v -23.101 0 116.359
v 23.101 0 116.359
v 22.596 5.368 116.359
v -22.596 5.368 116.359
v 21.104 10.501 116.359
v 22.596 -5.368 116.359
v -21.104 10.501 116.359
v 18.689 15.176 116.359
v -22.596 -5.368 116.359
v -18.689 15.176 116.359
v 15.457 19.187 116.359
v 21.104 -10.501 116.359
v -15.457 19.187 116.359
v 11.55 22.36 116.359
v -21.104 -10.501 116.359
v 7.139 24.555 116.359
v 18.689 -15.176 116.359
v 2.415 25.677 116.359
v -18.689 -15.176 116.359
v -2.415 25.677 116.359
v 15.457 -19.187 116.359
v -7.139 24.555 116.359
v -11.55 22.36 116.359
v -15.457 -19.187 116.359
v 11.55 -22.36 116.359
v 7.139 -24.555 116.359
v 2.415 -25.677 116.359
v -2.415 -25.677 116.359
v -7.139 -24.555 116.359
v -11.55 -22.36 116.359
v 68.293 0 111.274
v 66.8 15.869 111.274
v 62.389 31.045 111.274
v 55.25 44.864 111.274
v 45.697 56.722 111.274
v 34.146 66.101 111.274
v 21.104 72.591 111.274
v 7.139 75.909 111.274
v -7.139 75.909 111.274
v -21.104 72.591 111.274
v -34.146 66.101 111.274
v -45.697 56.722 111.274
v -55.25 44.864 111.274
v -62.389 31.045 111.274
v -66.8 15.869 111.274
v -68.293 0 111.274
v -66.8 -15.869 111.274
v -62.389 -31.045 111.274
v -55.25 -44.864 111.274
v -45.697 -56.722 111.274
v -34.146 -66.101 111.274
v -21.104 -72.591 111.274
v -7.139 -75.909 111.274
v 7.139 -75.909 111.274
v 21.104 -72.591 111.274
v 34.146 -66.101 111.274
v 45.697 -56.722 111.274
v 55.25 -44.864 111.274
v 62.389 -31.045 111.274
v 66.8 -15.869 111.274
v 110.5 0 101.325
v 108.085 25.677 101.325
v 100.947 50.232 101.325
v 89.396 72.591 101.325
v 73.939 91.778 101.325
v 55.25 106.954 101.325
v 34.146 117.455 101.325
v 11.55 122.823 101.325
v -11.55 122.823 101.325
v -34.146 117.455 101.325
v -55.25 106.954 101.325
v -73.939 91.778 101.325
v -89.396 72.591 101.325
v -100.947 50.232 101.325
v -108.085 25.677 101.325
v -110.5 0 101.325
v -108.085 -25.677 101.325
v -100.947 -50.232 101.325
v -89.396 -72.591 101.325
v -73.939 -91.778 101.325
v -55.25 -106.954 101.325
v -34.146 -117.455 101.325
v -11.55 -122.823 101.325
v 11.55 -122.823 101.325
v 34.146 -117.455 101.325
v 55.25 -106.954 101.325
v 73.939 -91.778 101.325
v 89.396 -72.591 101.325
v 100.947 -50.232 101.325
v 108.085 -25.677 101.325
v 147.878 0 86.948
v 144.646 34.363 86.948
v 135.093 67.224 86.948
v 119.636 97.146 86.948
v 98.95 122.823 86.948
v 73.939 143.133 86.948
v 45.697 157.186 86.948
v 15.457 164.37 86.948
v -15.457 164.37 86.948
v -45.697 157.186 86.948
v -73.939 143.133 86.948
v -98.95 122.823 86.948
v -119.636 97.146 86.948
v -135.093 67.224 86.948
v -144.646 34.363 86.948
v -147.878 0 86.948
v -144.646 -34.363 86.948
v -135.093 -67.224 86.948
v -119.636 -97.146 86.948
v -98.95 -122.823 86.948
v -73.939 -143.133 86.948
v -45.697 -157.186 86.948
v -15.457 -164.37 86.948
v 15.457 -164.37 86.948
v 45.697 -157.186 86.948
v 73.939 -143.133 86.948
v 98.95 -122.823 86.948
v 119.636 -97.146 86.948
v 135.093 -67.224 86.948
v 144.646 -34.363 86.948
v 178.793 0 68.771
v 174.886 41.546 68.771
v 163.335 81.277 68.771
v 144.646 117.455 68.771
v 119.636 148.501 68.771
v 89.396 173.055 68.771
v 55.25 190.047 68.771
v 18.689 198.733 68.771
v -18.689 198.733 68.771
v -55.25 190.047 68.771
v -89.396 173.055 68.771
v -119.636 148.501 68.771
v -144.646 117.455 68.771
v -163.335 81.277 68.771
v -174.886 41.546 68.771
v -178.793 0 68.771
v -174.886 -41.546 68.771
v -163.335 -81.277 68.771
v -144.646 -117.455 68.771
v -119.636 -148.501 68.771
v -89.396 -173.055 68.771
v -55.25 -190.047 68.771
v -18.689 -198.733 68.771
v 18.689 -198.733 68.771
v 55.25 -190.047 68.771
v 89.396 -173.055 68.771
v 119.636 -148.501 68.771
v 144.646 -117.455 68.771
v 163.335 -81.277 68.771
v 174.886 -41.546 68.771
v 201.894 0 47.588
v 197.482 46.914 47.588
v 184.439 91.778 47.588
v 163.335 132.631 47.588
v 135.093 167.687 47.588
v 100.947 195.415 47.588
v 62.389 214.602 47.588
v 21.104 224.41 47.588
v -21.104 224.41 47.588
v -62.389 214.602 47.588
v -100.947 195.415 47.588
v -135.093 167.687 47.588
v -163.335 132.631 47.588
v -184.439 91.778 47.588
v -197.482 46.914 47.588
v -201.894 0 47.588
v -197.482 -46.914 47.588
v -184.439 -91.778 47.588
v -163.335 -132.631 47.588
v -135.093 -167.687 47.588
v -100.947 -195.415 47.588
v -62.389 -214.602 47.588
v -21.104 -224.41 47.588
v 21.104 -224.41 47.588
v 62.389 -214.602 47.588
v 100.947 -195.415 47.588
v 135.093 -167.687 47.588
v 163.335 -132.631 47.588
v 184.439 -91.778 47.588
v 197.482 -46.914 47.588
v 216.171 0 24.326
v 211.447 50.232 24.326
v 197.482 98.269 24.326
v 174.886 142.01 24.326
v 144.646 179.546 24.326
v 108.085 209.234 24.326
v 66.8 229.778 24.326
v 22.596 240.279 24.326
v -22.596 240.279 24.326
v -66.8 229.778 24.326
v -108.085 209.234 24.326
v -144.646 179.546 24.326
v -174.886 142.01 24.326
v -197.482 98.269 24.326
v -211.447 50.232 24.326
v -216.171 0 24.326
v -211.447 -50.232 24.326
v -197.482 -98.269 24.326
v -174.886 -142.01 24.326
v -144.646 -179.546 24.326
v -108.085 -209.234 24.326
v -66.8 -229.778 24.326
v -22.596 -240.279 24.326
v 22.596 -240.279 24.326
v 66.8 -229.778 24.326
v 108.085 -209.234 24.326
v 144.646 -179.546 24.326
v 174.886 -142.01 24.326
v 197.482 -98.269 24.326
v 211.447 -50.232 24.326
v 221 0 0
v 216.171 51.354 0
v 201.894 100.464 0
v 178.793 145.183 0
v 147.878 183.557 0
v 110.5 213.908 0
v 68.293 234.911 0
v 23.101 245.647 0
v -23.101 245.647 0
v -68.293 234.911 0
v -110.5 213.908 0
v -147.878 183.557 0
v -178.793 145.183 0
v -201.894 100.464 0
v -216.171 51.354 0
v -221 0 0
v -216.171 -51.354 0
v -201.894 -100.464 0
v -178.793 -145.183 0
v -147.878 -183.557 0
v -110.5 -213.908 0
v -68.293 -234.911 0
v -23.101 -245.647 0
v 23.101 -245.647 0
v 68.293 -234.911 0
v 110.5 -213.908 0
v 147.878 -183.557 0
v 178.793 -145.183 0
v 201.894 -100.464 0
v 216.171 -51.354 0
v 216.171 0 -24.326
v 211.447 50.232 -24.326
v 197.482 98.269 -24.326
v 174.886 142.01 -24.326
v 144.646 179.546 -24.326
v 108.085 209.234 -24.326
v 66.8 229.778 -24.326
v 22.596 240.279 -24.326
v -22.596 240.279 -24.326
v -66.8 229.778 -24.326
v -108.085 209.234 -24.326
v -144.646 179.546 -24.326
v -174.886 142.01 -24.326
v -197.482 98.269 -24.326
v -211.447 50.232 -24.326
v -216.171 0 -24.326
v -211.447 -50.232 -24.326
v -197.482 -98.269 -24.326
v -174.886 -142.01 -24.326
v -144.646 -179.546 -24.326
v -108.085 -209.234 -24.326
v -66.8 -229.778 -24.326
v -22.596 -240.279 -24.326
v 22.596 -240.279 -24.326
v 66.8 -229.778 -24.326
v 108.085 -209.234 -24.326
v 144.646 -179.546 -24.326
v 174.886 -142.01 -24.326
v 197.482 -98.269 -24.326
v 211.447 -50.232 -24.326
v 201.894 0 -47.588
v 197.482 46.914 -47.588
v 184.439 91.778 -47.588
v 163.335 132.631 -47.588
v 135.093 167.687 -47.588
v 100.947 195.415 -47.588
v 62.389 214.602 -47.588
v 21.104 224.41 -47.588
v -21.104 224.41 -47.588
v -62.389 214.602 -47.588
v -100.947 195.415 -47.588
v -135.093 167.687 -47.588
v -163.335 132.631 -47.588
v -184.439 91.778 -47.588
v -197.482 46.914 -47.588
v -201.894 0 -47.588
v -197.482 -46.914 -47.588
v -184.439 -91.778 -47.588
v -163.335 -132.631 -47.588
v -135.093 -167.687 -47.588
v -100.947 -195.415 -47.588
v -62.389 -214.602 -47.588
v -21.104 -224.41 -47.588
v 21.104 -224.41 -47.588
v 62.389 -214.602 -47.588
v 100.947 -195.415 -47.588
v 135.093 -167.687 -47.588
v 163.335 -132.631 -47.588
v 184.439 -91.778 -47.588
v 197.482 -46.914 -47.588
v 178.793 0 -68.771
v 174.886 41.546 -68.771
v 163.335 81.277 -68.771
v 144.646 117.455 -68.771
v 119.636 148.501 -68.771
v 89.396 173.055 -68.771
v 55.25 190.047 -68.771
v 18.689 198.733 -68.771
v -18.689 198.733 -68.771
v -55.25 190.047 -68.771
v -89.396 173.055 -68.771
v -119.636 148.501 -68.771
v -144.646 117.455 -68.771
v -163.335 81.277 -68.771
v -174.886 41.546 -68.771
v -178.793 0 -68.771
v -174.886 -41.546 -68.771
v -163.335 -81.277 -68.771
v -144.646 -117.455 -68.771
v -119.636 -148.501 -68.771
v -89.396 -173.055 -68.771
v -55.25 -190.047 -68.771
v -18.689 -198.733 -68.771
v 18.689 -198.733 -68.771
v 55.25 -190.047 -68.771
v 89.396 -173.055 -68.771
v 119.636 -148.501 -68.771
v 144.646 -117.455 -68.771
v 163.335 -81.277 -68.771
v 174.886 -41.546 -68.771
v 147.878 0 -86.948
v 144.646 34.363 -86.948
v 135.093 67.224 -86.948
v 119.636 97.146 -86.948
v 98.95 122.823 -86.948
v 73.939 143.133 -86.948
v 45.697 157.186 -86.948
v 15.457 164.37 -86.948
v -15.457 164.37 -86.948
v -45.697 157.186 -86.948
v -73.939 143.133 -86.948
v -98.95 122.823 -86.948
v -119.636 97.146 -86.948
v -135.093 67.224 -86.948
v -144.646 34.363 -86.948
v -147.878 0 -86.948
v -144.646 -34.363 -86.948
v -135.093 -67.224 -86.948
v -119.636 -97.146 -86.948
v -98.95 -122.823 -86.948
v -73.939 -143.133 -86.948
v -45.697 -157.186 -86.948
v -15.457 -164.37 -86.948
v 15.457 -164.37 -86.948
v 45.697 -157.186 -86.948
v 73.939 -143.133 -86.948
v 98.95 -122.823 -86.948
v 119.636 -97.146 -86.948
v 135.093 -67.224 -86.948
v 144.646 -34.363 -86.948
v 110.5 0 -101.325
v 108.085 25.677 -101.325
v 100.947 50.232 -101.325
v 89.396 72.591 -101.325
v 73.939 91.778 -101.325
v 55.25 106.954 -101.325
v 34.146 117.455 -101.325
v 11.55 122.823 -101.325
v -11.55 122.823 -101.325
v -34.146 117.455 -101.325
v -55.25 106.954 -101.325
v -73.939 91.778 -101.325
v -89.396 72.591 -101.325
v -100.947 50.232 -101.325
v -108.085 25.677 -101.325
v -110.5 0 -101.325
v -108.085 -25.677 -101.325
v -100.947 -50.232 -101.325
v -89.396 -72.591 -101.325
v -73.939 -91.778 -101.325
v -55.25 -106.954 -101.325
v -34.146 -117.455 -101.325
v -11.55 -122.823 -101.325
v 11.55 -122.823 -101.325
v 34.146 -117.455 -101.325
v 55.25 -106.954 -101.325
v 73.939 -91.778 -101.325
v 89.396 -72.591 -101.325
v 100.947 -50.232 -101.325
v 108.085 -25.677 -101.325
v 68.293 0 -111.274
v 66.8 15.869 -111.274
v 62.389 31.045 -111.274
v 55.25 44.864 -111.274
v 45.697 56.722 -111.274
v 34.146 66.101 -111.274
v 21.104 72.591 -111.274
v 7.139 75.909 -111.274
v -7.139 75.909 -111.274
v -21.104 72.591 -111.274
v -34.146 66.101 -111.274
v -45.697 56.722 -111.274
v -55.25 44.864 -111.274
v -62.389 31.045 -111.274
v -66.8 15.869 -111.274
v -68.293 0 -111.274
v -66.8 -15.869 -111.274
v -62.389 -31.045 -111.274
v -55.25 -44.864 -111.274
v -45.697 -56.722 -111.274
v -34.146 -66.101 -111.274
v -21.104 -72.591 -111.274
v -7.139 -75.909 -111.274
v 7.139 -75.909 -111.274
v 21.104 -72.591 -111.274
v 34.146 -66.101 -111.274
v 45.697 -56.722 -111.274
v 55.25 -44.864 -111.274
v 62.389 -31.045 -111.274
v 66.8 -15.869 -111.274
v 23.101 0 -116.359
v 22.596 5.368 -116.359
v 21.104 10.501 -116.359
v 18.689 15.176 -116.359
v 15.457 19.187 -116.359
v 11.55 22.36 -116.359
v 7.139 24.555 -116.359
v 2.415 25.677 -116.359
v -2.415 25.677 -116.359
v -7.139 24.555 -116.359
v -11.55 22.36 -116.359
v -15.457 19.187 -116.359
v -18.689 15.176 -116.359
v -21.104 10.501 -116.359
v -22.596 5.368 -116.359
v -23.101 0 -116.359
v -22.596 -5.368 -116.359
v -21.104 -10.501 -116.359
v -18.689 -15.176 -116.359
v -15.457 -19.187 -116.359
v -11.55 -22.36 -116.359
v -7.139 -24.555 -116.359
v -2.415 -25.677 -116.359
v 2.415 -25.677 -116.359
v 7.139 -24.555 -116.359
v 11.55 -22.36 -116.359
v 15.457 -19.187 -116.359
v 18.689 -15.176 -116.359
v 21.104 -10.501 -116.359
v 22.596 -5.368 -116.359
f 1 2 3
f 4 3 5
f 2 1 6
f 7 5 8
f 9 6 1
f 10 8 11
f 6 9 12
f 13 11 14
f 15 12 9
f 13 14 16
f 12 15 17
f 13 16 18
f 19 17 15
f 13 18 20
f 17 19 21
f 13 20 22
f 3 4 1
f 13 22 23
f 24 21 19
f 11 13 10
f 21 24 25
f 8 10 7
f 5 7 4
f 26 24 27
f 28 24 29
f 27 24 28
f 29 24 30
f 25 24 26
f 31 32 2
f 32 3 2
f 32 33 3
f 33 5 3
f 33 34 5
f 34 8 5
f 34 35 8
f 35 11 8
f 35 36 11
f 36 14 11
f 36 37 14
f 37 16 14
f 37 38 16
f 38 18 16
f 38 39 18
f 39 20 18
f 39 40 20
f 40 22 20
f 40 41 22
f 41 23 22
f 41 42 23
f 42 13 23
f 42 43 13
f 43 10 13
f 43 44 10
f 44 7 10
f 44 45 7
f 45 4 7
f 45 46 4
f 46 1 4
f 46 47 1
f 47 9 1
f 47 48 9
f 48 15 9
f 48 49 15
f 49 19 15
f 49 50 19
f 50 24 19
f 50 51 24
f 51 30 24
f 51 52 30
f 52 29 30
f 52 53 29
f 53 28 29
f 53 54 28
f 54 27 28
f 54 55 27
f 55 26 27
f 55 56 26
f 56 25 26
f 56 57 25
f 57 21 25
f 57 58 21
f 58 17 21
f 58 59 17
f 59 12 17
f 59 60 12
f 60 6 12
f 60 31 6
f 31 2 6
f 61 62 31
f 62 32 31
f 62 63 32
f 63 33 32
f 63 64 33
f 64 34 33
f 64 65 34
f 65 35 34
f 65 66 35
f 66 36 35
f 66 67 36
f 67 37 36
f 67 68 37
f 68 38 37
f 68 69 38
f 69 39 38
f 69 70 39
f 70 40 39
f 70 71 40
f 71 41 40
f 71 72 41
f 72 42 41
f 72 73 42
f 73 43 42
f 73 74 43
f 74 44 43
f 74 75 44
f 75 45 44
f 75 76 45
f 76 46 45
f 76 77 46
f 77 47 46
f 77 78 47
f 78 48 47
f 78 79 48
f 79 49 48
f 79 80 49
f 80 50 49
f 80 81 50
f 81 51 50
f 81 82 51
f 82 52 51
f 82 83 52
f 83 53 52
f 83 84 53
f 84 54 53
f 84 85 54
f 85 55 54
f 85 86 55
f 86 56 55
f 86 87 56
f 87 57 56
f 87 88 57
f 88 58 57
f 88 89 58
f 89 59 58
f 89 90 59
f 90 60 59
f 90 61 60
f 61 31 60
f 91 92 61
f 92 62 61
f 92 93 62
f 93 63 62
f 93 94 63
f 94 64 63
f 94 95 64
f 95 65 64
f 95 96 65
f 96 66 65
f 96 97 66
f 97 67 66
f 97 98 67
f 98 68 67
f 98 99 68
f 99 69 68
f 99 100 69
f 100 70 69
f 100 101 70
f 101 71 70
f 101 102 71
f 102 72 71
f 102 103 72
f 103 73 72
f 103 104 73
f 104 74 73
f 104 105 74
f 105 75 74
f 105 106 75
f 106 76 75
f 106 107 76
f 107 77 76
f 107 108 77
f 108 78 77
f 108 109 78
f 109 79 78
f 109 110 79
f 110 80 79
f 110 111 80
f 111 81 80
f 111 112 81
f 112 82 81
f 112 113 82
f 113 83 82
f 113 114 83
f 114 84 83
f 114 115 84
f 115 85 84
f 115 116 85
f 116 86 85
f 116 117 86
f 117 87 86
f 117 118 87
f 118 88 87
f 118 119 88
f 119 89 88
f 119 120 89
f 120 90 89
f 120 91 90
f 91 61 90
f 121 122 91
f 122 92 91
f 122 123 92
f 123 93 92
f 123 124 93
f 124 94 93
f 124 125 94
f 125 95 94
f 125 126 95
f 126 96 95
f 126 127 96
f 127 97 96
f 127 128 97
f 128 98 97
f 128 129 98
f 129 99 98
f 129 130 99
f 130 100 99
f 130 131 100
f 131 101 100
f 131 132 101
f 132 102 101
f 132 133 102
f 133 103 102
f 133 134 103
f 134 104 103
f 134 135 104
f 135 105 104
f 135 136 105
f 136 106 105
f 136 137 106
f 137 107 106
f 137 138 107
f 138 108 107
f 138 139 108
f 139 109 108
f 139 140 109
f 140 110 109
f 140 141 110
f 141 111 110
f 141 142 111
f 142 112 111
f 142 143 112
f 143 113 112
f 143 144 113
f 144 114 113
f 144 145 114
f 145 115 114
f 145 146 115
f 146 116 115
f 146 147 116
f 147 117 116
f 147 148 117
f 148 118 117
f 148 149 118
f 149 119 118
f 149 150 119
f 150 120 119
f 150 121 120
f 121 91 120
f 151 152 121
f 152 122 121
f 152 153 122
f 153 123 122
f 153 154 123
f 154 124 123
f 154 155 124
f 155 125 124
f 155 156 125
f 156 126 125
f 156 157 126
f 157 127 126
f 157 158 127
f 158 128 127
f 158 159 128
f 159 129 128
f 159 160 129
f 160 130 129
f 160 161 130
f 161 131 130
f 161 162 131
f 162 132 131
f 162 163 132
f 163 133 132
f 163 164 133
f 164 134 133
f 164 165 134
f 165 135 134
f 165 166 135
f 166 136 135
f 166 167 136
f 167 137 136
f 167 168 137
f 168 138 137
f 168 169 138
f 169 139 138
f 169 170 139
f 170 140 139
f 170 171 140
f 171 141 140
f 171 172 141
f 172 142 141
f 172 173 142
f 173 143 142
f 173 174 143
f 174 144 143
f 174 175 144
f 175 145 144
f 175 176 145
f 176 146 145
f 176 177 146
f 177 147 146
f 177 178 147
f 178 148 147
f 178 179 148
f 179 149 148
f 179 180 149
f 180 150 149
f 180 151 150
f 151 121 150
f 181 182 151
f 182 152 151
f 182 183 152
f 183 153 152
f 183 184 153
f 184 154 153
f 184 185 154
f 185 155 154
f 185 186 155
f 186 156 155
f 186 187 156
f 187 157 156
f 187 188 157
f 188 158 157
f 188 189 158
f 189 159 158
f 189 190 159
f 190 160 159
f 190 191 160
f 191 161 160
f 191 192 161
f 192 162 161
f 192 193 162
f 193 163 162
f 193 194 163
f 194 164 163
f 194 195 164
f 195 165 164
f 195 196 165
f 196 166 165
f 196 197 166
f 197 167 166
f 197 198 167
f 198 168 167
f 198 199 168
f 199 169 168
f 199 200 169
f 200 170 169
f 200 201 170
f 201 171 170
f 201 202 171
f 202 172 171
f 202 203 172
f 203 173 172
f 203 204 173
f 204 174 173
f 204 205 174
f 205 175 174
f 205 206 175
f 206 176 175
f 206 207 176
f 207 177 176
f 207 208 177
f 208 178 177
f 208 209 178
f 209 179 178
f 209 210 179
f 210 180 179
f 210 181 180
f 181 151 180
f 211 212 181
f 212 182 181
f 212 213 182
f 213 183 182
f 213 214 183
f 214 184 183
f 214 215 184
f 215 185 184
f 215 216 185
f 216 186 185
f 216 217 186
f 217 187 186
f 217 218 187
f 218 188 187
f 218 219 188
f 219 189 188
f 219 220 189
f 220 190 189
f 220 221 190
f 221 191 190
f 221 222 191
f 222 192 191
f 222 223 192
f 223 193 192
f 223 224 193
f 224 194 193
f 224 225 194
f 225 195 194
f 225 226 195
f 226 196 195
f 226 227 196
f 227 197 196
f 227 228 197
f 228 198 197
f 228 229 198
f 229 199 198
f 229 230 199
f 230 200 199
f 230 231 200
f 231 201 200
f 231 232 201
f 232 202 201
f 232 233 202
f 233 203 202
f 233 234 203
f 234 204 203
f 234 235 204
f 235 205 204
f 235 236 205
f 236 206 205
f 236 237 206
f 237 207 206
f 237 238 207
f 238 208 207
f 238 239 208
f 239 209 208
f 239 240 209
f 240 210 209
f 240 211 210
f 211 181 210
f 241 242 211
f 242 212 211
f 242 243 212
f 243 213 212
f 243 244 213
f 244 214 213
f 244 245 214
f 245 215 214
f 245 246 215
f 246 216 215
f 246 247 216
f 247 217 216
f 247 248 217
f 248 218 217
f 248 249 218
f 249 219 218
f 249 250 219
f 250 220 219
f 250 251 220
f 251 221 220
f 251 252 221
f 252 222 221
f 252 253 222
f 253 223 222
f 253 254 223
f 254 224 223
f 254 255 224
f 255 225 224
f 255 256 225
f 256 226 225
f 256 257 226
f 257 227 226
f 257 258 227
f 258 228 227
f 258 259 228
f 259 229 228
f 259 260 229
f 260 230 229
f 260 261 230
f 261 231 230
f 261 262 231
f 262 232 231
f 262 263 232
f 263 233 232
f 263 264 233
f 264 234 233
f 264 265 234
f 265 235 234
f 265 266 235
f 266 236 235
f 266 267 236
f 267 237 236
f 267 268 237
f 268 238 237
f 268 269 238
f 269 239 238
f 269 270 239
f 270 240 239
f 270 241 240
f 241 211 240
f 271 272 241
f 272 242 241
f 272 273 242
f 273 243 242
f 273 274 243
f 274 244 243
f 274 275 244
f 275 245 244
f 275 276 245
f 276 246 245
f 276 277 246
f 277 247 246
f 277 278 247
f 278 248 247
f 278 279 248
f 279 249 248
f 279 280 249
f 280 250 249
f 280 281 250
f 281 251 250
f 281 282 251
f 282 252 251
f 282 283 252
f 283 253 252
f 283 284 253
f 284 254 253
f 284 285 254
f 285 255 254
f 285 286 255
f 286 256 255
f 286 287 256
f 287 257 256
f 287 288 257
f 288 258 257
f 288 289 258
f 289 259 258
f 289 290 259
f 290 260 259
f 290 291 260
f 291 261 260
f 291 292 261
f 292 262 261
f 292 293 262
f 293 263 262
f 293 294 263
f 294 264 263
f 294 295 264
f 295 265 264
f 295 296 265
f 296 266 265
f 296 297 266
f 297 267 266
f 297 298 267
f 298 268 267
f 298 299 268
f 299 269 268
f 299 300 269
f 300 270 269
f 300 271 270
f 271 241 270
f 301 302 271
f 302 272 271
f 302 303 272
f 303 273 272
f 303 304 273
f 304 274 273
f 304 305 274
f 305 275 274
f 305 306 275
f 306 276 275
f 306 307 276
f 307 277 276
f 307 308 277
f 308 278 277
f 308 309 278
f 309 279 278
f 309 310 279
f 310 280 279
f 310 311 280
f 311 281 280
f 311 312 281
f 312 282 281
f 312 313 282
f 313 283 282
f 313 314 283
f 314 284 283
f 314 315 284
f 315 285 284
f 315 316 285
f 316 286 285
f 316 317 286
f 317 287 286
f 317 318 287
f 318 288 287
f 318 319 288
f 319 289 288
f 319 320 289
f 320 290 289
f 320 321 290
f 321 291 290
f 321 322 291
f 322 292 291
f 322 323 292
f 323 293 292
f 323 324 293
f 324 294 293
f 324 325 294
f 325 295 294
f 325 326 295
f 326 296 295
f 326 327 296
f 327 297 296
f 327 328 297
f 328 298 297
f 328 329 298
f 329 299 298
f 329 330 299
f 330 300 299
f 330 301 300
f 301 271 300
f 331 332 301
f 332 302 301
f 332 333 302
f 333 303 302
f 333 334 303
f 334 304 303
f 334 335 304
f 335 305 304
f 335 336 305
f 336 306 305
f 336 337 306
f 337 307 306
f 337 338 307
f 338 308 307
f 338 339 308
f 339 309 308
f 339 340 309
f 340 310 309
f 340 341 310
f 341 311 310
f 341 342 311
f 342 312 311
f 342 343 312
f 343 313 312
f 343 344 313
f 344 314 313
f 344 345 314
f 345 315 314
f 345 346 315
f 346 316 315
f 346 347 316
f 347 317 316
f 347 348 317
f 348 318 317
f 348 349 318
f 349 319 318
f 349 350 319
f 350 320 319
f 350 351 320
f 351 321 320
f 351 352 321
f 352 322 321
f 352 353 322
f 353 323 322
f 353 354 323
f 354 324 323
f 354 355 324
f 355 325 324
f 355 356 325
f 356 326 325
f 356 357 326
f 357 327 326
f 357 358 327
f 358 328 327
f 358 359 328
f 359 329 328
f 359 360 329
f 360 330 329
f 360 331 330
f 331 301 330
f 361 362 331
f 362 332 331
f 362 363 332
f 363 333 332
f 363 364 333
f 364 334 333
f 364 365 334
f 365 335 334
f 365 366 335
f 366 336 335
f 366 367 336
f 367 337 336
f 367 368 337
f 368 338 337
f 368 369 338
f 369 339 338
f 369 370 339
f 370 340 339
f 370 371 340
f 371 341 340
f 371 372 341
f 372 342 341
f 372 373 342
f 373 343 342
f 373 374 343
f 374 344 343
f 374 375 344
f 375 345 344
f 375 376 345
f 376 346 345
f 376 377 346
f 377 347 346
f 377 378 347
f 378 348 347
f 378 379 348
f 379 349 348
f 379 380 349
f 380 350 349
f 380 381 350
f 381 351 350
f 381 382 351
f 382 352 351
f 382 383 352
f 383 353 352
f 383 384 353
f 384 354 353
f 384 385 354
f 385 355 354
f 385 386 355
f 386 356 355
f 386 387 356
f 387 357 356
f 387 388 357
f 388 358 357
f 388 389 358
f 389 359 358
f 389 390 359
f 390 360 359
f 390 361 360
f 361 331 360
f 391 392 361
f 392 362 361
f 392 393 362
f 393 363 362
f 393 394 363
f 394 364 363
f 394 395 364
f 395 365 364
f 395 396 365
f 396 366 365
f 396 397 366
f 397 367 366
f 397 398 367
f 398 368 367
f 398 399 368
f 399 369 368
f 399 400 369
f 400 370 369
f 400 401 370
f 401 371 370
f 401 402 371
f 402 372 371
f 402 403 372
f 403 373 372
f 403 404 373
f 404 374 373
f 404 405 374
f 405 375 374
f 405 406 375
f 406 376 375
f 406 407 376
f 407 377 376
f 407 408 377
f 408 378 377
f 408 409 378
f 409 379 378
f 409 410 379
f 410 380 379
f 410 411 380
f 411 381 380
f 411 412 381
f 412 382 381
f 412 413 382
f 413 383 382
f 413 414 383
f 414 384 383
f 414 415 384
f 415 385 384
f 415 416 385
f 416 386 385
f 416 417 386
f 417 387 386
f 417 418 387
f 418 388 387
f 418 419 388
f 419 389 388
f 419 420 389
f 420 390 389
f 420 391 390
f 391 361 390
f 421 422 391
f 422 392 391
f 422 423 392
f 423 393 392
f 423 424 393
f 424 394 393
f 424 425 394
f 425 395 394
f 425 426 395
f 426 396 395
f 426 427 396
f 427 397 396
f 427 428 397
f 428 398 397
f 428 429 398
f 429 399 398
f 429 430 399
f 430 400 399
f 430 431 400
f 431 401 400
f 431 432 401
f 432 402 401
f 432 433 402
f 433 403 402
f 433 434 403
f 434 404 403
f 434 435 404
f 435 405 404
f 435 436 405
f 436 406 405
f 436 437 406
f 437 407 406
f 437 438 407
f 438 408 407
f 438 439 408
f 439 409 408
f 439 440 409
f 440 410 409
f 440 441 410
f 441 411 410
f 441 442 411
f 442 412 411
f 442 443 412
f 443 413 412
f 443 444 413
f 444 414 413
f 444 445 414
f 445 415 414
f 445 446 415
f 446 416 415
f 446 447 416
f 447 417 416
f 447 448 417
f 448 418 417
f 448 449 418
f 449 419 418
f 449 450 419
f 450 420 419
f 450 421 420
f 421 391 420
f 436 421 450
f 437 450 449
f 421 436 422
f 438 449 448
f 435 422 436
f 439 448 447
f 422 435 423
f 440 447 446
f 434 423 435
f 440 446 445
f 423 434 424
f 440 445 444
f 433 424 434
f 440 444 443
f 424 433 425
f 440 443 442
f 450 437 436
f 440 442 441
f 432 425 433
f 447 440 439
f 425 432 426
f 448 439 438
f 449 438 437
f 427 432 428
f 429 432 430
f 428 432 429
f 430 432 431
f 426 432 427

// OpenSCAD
// Generated by SolidPython 1.0.1 on 2020-07-29 00:46:53


scale(v = [17, 19, 9]) {
	sphere(r = 13);
}
/***********************************************
*********      SolidPython code:      **********
************************************************
 
# import packages: SolidPython
from solid import *
from solid.utils import *
from itertools import chain, combinations, permutations


class Resize:

    def __init__(self, scad_file):
        self.scad_file = scad_file
        #self.scad_file = import_scad(scad_file)
        # cone/cylinder param:
        self.r1 = 0
        self.r2 = 0
        self.h = 0
        # rectangular prism param:
        self.w = 0
        self.l = 0
        # ellipse param:
        self.r = 0

    # import OpenScad code (file name corresponds to shape)


    # classify shape + parameters
    def assign(self, param1, param2, param3):
        if self.scad_file == 'cone.scad':
            self.r1 = param1
            self.r2 = param2
            self.h = param3
        elif self.scad_file == 'cylinder.scad':
            self.r1 = param1
            self.r2 = param2
            self.h = param3
        elif self.scad_file == 'rectangularPrism.scad':
            self.h = param1
            self.l = param2
            self.w = param3
        else:
            self.r = param1
            self.h = param2

    # resize parameters
    def iterate(self):
        x = range(3, 20, 2)
        i = 1
        if self.scad_file == 'cone.scad':
            tempList = list(permutations(x, 2))
            for temp in tempList:
                param1 = temp[0]
                param2 = temp[1]
                filepath = 'produced_scad_files/' + 'cone' + str(param1) + '_' + str(param2) + '_' + '.scad'
                scad_render_to_file(cylinder(h=param1, r1=param2, r2=0), filepath)

        elif self.scad_file == 'cylinder.scad':
            tempList = list(permutations(x, 3))
            for temp in tempList:
                param1 = temp[0]
                param2 = temp[1]
                filepath = 'produced_scad_files/' + 'cylinder' + str(param1) + '_' + str(param2) + '_' + '.scad'
                scad_render_to_file(cylinder(h=param1, r1=param2, r2=param2), filepath)

        elif self.scad_file == 'rectangularPrism.scad':
            tempList = list(permutations(x, 3))
            for temp in tempList:
                param1 = temp[0]
                param2 = temp[1]
                param3 = temp[2]
                filepath = 'produced_scad_files/' + 'rectangularPrism' + str(param1) + '_' + str(param2) + '_' + str(
                    param3) + '.scad'
                scad_render_to_file(cube(size=(param1, param2, param3)), filepath)

        elif self.scad_file == 'ellipse.scad':
            tempList = list(permutations(x, 4))
            for temp in tempList:
                param1 = temp[0]
                param2 = temp[1]
                param3 = temp[2]
                param4 = temp[3]
                filepath = 'produced_scad_files/' + 'ellipse' + str(param1) + '_' + str(param2) + '_' + str(param3) + '_' + str(param4) + '.scad'
                scad_render_to_file(scale([param1, param2, param3])(sphere(r=param4)), filepath)

    def render_to_scadfile(self):
        scad_render_to_file(scad, 'example.scad') 
 
************************************************/
